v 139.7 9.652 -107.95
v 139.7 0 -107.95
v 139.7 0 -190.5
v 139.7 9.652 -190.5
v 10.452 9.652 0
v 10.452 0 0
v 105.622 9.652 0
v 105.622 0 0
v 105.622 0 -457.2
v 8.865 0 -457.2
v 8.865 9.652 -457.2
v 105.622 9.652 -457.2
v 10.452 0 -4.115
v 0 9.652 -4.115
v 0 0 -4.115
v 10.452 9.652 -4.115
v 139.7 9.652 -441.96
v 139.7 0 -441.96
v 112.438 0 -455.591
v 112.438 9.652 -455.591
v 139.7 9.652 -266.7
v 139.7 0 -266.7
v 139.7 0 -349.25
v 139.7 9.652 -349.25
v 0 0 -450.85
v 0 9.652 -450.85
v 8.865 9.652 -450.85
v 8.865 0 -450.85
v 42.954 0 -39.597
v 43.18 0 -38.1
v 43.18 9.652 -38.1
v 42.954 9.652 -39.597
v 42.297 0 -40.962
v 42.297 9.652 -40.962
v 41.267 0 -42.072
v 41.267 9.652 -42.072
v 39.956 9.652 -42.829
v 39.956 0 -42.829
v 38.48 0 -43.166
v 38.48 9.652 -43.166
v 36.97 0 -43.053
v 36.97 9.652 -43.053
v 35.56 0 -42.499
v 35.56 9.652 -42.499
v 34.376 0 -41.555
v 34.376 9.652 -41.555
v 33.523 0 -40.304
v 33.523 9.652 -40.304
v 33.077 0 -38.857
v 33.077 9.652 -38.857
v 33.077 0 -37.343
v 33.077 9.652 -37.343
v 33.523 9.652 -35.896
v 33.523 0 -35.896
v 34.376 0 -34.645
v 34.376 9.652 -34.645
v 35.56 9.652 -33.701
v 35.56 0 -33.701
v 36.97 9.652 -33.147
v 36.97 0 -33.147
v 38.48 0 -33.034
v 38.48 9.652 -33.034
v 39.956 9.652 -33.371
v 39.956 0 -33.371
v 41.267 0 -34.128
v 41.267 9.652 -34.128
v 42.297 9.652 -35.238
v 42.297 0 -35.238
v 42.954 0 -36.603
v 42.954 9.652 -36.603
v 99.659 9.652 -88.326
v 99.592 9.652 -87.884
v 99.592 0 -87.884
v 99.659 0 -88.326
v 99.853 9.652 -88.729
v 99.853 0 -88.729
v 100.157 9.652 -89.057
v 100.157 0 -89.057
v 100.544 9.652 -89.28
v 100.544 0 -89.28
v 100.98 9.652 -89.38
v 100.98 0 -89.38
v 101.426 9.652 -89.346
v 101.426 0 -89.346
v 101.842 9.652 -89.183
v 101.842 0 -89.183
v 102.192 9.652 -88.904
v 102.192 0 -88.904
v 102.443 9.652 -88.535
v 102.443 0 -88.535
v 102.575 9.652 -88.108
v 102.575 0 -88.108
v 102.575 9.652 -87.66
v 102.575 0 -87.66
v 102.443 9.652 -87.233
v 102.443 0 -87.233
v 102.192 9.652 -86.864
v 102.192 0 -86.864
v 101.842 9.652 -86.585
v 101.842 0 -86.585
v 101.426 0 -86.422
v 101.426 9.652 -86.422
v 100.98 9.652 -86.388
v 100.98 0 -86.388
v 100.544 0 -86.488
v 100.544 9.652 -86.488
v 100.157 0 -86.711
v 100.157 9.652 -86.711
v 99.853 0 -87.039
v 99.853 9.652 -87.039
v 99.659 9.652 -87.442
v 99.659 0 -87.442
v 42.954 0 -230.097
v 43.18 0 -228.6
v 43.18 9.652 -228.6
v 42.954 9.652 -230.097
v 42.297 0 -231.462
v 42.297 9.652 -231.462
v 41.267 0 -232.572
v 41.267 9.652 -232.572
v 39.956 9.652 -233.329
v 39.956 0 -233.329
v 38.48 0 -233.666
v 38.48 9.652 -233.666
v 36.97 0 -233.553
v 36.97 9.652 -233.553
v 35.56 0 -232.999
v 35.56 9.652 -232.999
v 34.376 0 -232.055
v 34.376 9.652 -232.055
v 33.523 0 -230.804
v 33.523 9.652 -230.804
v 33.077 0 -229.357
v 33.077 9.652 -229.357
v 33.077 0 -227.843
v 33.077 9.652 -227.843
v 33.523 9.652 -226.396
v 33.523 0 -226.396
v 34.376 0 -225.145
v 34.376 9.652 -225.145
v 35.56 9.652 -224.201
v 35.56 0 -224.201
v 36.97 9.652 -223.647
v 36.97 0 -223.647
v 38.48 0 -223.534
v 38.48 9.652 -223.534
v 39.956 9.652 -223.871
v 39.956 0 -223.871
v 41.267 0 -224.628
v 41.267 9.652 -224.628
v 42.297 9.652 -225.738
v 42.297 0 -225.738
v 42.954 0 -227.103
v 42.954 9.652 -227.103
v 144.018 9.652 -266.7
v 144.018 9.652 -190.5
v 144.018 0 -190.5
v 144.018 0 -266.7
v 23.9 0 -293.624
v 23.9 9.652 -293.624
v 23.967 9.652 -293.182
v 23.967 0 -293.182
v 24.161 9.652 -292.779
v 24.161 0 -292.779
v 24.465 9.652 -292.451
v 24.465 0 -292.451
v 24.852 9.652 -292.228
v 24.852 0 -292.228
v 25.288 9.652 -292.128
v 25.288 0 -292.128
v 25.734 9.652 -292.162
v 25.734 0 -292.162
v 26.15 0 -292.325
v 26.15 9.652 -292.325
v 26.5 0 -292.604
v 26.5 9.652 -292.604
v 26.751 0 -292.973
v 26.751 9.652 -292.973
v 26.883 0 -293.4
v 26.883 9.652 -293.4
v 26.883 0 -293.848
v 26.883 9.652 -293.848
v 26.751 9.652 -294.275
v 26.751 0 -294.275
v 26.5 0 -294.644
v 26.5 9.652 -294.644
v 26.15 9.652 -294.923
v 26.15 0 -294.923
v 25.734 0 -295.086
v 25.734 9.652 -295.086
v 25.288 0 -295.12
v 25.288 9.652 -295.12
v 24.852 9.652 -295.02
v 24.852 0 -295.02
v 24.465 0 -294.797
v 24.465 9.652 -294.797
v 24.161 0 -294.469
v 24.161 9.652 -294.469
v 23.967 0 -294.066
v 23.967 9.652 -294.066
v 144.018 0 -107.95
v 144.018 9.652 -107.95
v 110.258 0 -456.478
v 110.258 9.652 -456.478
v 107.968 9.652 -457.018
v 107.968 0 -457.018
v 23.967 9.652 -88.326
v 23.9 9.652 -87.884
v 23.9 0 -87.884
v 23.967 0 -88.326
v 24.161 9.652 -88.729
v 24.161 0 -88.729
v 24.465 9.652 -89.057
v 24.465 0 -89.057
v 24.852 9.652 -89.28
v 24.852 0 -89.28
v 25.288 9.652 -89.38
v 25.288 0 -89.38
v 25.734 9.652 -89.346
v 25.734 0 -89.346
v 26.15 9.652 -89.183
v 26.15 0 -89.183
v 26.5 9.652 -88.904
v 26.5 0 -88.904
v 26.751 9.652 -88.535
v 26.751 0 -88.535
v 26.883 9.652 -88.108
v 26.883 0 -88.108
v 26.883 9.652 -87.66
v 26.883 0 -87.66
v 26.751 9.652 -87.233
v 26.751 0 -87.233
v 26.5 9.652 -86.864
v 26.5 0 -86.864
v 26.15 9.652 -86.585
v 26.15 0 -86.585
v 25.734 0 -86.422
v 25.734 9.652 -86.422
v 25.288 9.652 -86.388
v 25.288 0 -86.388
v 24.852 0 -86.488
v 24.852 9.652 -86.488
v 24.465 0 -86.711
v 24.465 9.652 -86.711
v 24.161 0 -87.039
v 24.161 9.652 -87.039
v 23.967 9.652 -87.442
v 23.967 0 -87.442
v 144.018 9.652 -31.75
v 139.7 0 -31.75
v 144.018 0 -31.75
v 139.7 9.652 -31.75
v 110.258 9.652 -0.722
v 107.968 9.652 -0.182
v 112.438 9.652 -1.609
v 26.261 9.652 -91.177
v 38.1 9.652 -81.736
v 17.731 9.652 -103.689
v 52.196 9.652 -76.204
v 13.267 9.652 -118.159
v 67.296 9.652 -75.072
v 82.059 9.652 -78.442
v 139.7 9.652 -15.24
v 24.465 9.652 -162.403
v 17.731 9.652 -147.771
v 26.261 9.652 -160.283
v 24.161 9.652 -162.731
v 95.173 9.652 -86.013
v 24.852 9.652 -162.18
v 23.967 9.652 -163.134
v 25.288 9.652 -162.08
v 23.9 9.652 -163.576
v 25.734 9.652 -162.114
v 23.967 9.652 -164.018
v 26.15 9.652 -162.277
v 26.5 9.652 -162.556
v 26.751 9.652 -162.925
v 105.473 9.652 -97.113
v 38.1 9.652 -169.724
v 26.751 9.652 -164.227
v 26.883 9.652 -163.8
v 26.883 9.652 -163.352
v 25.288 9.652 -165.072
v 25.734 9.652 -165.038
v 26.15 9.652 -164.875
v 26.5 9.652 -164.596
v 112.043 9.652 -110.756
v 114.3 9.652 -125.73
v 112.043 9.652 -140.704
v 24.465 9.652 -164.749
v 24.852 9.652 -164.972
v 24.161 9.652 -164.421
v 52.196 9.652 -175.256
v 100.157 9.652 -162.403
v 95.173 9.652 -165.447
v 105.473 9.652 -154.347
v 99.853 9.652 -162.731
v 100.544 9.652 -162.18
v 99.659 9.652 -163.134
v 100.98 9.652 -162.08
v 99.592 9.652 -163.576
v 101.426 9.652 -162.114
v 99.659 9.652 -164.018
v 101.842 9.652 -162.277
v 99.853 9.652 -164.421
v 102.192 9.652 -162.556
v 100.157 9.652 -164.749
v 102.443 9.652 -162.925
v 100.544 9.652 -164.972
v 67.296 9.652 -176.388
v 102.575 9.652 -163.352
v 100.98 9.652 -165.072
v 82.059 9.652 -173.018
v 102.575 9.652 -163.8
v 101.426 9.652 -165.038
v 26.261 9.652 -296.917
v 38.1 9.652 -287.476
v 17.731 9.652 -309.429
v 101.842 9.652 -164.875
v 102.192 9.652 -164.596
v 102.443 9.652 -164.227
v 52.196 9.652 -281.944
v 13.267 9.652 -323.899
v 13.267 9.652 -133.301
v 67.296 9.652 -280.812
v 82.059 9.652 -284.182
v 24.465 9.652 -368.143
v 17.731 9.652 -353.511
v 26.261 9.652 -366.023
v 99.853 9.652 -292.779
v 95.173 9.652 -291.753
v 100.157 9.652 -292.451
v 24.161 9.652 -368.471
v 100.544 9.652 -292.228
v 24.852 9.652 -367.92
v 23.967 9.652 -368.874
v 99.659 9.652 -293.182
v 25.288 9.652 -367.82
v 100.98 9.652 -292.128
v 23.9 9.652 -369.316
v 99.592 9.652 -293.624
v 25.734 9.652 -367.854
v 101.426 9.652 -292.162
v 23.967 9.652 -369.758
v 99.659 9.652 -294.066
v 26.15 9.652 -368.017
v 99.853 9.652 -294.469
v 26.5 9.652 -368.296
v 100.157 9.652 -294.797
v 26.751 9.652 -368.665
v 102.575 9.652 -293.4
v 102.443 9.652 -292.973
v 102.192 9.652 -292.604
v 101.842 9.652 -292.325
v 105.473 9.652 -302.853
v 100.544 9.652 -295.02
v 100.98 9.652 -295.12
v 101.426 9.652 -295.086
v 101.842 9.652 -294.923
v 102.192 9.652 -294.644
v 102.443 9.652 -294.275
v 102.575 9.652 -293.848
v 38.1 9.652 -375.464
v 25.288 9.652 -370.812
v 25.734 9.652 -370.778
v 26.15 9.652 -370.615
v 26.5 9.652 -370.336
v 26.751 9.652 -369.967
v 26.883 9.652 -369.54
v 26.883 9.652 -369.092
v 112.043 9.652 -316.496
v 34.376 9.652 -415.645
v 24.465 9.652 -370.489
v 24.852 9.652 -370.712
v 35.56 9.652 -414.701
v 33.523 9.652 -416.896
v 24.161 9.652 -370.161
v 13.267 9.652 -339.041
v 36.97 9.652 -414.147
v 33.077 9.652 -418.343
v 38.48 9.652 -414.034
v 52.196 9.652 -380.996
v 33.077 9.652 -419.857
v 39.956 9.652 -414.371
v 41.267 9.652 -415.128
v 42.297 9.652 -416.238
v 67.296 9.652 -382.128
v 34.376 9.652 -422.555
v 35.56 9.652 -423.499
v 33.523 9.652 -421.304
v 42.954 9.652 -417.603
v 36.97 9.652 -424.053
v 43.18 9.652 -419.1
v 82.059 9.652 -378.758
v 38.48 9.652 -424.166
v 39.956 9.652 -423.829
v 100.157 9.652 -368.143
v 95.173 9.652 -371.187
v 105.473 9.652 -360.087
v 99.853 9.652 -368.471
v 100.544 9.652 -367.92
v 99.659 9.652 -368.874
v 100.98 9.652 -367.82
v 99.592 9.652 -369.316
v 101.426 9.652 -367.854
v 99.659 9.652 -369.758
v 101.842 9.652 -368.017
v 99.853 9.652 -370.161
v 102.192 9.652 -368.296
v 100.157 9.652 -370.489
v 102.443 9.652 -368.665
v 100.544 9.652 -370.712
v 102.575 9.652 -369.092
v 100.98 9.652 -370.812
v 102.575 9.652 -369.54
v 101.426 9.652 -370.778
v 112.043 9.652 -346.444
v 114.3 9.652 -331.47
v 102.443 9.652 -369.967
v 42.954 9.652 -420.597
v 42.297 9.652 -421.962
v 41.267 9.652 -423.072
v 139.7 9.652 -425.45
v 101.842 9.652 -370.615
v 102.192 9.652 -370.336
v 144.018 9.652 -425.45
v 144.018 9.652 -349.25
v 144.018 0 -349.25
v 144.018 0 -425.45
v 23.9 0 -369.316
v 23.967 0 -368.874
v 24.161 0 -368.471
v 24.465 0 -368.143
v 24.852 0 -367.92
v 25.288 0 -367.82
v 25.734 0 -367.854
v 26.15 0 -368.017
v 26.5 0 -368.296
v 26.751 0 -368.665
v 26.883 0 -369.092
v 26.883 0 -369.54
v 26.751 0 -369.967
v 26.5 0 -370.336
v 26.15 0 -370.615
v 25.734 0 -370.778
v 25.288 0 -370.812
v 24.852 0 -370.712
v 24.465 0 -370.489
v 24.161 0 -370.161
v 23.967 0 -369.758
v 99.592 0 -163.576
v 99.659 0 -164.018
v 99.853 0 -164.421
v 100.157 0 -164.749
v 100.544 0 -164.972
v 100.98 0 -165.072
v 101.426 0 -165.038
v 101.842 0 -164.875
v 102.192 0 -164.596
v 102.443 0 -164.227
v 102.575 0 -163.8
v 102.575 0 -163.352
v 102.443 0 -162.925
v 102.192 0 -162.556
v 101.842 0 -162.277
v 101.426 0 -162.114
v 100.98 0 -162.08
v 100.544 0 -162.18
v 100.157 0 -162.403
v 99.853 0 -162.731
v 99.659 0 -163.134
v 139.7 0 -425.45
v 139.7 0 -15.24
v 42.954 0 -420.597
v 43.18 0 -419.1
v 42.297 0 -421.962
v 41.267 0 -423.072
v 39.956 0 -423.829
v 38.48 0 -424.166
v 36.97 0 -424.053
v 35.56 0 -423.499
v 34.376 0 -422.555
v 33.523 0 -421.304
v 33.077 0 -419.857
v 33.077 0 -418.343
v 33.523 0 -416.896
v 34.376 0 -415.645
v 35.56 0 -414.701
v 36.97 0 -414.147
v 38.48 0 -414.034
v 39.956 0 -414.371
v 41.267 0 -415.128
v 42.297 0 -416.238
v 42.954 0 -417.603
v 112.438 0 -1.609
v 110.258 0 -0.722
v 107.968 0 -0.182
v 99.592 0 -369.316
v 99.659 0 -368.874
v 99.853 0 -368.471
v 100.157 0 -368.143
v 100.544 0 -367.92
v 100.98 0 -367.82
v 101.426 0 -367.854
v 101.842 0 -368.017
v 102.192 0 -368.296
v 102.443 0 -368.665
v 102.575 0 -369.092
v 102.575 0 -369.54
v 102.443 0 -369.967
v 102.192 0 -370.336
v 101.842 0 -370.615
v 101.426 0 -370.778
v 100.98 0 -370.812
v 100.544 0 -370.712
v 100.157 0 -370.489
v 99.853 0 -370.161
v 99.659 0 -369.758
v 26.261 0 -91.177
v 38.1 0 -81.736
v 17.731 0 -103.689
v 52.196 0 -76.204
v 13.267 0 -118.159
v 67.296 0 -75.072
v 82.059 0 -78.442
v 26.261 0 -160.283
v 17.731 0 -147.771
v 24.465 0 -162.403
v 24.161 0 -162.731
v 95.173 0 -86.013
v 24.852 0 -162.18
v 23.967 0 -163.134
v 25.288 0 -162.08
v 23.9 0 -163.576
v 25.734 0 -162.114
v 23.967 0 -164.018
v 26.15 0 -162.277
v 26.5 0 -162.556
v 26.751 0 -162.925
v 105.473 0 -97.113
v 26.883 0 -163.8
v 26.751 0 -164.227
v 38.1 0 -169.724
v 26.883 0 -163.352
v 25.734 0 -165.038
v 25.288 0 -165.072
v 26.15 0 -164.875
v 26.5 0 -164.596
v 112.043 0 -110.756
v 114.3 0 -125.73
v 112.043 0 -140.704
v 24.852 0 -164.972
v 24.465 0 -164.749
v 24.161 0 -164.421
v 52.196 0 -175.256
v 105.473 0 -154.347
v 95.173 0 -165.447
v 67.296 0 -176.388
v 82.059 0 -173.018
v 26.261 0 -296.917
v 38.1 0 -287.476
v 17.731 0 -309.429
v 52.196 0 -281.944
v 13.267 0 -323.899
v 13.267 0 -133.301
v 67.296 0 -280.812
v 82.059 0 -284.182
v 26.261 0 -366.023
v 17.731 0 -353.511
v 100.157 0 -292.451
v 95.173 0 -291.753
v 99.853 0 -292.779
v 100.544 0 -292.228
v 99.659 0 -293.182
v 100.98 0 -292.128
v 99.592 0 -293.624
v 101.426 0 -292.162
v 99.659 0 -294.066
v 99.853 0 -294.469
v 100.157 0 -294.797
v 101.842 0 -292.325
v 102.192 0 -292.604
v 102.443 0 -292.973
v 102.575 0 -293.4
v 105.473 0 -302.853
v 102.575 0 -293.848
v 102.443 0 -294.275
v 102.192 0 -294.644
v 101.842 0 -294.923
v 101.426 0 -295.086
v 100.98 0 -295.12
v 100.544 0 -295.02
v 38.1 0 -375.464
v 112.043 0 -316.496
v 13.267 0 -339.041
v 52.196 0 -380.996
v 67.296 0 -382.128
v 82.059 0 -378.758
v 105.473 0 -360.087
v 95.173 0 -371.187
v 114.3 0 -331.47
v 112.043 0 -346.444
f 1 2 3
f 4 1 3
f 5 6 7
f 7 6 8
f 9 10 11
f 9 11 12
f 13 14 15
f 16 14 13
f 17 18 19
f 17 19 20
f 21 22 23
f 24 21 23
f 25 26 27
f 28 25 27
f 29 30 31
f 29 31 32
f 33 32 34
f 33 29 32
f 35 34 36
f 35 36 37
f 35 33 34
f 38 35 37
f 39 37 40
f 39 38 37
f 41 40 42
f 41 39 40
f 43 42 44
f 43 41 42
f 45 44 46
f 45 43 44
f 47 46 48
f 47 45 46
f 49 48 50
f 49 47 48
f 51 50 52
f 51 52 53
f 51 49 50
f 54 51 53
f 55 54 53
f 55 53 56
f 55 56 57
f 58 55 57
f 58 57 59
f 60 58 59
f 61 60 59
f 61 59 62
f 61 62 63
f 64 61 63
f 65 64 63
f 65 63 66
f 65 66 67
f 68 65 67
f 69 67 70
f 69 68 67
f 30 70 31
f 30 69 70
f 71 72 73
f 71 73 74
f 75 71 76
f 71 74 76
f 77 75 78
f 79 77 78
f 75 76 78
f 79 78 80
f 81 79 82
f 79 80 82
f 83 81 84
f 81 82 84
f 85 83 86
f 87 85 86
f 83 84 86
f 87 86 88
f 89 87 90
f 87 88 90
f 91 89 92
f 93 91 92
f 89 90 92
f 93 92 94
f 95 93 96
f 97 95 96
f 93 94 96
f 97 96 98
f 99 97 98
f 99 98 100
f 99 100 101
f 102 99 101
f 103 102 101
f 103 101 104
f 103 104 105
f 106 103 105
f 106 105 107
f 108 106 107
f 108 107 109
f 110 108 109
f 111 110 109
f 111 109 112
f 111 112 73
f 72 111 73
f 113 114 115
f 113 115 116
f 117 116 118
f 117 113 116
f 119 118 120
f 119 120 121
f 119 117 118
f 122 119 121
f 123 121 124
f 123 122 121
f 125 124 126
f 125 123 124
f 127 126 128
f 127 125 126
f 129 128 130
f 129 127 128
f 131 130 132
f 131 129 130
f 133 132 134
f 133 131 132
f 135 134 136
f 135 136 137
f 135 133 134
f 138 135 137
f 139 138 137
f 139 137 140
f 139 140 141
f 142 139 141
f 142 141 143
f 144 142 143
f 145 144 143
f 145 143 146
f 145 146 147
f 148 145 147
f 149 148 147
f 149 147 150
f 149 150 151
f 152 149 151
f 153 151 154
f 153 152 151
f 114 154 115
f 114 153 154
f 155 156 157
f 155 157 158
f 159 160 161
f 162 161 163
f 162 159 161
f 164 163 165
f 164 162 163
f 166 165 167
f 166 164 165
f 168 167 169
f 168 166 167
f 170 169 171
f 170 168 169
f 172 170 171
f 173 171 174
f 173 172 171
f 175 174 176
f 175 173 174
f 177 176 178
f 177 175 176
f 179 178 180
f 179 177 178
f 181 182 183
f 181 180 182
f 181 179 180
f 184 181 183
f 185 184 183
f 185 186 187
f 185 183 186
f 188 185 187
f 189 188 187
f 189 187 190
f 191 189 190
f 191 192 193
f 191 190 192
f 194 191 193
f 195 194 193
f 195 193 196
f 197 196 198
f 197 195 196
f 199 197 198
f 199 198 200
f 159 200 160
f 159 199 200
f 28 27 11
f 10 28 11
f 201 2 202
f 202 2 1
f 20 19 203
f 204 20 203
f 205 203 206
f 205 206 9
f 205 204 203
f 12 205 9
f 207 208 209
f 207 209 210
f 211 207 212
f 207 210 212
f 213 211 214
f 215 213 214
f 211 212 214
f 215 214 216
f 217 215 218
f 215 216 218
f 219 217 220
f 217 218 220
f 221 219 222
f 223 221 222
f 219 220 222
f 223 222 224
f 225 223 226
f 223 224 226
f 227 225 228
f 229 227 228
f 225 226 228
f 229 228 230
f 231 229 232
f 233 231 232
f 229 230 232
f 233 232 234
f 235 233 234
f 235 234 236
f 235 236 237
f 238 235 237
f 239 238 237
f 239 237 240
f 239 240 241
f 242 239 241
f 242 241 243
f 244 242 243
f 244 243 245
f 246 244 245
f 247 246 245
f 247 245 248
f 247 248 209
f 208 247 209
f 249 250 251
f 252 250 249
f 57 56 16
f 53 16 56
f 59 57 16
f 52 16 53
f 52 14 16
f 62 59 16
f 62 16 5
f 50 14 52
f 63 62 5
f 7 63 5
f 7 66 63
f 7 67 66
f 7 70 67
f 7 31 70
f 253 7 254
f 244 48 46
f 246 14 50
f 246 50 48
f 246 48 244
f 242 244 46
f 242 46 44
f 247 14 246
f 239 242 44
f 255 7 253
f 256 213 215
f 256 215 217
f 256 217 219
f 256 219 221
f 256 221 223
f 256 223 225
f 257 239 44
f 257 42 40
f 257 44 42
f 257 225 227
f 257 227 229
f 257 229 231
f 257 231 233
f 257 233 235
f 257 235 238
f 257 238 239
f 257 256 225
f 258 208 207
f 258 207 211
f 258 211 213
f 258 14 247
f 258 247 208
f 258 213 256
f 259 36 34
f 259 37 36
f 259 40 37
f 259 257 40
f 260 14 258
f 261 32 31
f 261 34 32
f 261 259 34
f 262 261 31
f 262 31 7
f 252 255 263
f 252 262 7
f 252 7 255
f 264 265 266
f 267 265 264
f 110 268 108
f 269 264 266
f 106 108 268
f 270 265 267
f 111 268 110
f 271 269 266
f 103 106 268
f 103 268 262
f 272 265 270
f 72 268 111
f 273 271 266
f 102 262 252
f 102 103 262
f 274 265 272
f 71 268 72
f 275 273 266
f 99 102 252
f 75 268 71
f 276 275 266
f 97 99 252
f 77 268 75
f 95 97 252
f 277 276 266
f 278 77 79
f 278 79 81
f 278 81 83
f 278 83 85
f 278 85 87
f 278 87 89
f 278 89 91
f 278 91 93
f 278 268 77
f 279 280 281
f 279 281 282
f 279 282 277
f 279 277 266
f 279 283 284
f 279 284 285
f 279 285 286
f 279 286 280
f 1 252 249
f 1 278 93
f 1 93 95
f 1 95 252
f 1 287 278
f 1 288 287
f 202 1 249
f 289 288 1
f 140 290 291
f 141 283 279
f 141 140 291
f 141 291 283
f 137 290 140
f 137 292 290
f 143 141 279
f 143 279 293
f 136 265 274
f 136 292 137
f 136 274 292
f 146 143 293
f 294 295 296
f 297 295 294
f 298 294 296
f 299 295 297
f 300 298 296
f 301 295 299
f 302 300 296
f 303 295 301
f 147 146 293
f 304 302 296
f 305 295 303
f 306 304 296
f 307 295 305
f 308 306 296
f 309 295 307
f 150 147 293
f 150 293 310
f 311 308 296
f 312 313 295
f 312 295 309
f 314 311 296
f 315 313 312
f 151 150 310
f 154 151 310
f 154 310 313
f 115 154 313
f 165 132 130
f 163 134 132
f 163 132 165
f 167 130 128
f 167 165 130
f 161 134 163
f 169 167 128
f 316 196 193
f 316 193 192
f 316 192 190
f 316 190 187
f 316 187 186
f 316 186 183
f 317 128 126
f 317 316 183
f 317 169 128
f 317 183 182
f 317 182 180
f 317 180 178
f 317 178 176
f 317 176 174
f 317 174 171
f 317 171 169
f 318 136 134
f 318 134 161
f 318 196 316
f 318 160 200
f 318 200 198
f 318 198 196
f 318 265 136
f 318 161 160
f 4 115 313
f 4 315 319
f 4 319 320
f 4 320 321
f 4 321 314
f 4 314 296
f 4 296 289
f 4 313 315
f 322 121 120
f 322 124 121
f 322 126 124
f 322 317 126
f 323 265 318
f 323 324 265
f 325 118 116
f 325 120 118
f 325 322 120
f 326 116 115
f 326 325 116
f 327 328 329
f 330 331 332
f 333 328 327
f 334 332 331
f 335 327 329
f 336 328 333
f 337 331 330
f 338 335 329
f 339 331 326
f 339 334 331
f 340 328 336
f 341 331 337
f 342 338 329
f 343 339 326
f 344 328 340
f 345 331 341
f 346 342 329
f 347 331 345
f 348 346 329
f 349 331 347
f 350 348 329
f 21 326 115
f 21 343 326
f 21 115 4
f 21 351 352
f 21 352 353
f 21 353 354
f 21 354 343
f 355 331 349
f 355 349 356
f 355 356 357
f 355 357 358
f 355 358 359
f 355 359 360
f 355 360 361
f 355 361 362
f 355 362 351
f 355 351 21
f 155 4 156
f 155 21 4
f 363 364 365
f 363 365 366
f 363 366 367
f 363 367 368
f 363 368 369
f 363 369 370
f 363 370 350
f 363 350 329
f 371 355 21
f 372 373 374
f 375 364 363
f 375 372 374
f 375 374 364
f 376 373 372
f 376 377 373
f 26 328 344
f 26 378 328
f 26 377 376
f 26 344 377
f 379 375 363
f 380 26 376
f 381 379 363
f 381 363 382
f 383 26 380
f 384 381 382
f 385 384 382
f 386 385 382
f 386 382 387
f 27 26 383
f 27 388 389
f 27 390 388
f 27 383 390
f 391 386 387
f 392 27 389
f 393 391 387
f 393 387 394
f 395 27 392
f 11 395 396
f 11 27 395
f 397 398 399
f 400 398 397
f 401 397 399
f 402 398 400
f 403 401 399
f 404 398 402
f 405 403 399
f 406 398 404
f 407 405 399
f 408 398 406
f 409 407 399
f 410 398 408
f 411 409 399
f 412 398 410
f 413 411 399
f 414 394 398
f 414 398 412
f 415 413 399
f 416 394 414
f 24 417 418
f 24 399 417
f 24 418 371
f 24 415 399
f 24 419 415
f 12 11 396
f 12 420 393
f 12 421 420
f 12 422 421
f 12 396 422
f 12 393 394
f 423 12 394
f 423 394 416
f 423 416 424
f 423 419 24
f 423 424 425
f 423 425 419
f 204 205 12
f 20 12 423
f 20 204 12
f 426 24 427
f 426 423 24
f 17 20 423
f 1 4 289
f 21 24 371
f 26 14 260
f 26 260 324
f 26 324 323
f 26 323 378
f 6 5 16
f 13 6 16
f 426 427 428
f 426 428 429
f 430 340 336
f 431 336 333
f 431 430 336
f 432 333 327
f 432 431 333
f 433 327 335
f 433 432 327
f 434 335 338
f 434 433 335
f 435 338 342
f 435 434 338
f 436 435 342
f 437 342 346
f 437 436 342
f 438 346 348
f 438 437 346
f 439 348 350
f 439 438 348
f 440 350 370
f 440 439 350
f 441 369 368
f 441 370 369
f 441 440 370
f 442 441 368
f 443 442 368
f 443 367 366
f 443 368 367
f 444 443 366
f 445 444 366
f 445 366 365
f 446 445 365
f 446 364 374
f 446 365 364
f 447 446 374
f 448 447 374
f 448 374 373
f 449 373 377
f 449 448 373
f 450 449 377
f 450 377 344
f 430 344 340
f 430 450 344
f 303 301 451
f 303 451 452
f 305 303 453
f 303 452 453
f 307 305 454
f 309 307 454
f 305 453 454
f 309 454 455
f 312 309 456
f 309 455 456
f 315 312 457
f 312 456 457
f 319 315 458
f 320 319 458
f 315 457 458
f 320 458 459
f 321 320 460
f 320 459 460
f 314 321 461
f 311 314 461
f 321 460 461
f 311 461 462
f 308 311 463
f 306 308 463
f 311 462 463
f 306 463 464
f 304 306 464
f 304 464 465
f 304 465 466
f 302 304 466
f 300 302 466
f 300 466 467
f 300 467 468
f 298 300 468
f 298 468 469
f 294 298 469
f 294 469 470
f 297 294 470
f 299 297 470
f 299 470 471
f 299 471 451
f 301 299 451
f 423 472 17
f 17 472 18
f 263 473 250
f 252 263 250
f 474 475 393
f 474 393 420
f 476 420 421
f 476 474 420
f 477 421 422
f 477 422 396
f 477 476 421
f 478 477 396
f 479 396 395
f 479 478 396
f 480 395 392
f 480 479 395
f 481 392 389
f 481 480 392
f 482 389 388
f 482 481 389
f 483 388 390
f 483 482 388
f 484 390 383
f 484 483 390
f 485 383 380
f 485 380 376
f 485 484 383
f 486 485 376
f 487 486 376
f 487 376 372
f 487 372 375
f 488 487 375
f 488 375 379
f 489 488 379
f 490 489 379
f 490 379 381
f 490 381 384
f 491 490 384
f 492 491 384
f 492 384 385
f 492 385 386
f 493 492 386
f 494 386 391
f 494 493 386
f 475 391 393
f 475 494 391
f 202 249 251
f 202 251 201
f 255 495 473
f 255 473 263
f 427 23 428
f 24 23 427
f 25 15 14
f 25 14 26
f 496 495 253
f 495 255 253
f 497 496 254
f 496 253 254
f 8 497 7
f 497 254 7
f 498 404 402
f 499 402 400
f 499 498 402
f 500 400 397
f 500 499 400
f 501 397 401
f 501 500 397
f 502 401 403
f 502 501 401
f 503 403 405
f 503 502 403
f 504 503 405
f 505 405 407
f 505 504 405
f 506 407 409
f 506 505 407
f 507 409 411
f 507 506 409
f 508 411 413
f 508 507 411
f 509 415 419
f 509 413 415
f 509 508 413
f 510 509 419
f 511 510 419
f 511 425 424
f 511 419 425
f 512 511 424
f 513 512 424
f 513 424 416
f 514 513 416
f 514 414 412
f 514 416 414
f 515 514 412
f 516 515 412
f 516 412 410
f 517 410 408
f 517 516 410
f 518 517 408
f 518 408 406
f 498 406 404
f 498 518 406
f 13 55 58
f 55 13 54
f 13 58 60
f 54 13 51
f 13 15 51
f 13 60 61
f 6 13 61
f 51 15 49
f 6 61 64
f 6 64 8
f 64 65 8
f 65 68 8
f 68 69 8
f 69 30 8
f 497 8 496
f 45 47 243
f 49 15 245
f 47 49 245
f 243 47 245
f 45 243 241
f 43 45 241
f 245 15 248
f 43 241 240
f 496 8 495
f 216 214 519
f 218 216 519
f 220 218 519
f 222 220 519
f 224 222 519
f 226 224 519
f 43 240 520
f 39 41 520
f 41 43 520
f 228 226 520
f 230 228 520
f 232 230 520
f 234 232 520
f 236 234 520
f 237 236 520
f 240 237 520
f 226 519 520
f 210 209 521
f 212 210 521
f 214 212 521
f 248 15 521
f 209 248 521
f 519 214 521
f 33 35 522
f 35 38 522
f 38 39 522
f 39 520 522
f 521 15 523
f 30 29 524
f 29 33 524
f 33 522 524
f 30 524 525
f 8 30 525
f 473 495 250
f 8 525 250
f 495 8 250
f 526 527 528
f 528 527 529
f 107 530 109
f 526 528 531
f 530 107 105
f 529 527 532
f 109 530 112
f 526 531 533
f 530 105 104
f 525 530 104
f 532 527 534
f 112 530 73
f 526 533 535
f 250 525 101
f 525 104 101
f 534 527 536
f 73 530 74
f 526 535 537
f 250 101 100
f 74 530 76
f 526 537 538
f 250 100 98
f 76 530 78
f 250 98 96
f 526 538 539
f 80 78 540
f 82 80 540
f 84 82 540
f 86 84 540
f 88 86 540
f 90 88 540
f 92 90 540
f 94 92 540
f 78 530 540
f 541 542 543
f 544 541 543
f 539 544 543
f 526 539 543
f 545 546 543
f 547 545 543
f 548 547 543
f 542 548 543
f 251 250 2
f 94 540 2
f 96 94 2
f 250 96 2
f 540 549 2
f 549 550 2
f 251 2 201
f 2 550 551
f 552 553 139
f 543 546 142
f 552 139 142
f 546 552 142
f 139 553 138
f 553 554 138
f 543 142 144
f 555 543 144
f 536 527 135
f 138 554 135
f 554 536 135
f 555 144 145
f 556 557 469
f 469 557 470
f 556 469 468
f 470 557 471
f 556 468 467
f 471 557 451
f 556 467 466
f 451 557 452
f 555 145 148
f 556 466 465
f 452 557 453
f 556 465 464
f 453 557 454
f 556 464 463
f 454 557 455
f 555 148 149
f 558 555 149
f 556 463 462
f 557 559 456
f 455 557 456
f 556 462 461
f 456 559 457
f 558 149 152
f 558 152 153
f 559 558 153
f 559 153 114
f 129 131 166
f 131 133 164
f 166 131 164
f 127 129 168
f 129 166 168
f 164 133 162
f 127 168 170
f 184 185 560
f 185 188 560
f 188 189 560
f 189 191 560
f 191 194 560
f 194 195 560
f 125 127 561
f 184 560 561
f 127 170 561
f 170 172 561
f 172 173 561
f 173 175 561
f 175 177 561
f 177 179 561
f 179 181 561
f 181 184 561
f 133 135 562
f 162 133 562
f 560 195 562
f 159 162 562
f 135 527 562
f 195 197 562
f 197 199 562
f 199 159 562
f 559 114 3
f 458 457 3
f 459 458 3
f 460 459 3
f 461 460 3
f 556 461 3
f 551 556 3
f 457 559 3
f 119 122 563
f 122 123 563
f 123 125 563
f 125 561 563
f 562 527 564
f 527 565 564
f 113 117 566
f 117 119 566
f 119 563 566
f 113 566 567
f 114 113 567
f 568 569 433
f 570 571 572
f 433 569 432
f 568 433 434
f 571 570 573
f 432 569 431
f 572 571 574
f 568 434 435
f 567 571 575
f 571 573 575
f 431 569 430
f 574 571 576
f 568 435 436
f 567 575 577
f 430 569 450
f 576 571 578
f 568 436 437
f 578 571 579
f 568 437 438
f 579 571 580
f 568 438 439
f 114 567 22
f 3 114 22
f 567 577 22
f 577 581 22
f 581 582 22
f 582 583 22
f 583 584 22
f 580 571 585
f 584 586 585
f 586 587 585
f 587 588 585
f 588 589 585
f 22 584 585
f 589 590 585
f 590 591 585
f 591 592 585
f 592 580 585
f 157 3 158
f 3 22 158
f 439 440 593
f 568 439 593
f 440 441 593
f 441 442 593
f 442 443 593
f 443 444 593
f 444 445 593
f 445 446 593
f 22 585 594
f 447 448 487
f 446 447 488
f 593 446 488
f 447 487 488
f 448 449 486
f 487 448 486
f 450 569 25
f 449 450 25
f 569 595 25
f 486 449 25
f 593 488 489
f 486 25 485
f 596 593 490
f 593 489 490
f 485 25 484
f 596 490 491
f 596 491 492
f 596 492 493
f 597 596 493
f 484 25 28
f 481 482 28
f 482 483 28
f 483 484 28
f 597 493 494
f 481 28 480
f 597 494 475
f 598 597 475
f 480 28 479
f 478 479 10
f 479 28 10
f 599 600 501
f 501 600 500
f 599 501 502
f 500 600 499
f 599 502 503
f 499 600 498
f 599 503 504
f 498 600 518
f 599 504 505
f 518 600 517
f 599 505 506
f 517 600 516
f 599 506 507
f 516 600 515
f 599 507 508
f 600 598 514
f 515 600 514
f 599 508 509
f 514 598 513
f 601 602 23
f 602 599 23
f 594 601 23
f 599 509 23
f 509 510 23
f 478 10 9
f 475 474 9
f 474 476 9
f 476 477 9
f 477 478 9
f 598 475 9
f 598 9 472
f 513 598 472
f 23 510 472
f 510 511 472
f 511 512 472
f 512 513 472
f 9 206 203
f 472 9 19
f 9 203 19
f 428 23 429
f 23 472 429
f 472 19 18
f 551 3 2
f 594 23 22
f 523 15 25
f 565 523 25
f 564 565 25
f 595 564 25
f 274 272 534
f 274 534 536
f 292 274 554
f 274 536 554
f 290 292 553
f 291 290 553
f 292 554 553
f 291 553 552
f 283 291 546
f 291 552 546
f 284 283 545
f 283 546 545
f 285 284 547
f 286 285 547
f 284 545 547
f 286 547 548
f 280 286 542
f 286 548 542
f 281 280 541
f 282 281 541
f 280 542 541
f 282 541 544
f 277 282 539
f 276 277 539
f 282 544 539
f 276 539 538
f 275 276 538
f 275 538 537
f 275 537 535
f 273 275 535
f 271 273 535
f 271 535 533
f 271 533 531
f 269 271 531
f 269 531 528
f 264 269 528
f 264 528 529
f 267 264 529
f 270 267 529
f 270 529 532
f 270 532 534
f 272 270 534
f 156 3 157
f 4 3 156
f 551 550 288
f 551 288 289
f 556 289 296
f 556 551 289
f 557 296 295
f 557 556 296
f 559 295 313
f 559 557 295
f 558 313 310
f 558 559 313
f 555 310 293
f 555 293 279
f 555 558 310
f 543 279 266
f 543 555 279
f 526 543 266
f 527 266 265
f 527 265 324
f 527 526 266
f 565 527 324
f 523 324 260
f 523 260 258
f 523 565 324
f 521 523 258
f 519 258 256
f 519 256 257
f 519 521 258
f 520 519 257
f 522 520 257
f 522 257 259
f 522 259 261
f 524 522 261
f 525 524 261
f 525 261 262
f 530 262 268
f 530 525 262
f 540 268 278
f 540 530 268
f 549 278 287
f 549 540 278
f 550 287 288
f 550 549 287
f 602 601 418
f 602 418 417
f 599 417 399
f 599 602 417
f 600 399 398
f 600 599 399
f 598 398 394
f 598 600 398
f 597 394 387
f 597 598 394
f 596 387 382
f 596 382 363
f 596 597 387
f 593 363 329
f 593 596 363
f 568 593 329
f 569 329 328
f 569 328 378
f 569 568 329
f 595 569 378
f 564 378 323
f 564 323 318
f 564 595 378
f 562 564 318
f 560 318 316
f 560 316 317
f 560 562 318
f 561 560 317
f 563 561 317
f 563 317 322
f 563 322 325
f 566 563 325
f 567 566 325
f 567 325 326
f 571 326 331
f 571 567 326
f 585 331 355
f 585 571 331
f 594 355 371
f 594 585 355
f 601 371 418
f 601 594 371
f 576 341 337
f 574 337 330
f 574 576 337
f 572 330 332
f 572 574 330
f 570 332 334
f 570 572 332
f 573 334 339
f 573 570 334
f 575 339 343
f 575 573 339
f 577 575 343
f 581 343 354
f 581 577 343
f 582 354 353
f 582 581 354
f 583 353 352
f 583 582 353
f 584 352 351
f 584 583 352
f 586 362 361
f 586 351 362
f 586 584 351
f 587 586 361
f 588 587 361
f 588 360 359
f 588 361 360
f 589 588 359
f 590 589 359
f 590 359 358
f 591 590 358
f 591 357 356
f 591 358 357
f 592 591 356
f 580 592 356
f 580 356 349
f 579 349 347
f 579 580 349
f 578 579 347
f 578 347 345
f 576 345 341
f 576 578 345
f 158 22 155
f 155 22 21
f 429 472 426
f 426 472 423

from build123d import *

# Parameters (mm, degrees)
SKETCH1_W                    = 139.7
SKETCH1_H                    = 457.2
SKETCH1_R                    = 50.8
SKETCH1_R_2                  = 5.08
BOSS_EXTRUDE1_DEPTH          = 9.652
SKETCH4_W                    = 10.452383168
SKETCH4_H                    = 4.1148
SKETCH4_W_2                  = 8.864883168
SKETCH4_H_2                  = 6.35
CUT_EXTRUDE1_DEPTH           = 10.652
CHAMFER1_SIZE                = 15.24
CHAMFER1_SIZE2               = 30.48
CHAMFER2_SIZE                = 30.48
CHAMFER2_SIZE2               = 15.24
FILLET2_R                    = 15.24
SKETCH5_W                    = 76.2
SKETCH5_H                    = 9.652
BOSS_EXTRUDE2_DEPTH          = 4.318
F_3_0_3_DIAMETER_HOLE1_D     = 3
F_3_0_3_DIAMETER_HOLE1_DEPTH = 9.652


with BuildPart() as part:
    # Sketch1 → Boss-Extrude1 (new body)
    with BuildSketch(Plane(origin=(0, 0, 0), x_dir=(1, 0, 0), z_dir=(0, 1, 0))):
        with Locations((69.85, 228.6)):
            Rectangle(SKETCH1_W, SKETCH1_H)
        with Locations((63.5, 125.73)):
            Circle(SKETCH1_R, mode=Mode.SUBTRACT)
        with Locations((38.1, 38.1)):
            Circle(SKETCH1_R_2, mode=Mode.SUBTRACT)
        with Locations((38.1, 419.1)):
            Circle(SKETCH1_R_2, mode=Mode.SUBTRACT)
        with Locations((63.5, 331.47)):
            Circle(SKETCH1_R, mode=Mode.SUBTRACT)
        with Locations((38.1, 228.6)):
            Circle(SKETCH1_R_2, mode=Mode.SUBTRACT)
    extrude(amount=BOSS_EXTRUDE1_DEPTH)

    # Sketch4 → Cut-Extrude1 (cut, through all)
    with BuildSketch(Plane(origin=(0, 9.652, 0), x_dir=(1, 0, 0), z_dir=(0, 1, 0))):
        with Locations((5.226191584, 2.0574)):
            Rectangle(SKETCH4_W, SKETCH4_H)
        with Locations((4.432441584, 454.025)):
            Rectangle(SKETCH4_W_2, SKETCH4_H_2)
    extrude(amount=-CUT_EXTRUDE1_DEPTH, mode=Mode.SUBTRACT)

    # Chamfer1
    chamfer1_edges = [part.edges().sort_by_distance(p)[0] for p in [
        (139.7, 4.826, -457.2),
    ]]
    chamfer1_side = [part.faces().sort_by_distance(p)[0] for p in [
        (139.7, 4.826, -228.6),
    ]]
    chamfer(chamfer1_edges, length=CHAMFER1_SIZE, length2=CHAMFER1_SIZE2, reference=chamfer1_side[0])

    # Chamfer2
    chamfer2_edges = [part.edges().sort_by_distance(p)[0] for p in [
        (139.7, 4.826, 0),
    ]]
    chamfer2_side = [part.faces().sort_by_distance(p)[0] for p in [
        (75.076191584, 4.826, 0),
    ]]
    chamfer(chamfer2_edges, length=CHAMFER2_SIZE, length2=CHAMFER2_SIZE2, reference=chamfer2_side[0])

    # Fillet2
    fillet2_edges = [part.edges().sort_by_distance(p)[0] for p in [
        (109.22, 4.826, -457.2),
        (109.22, 4.826, 0),
    ]]
    fillet(fillet2_edges, radius=FILLET2_R)

    # Sketch5 → Boss-Extrude2 (add)
    with BuildSketch(Plane(origin=(139.7, 0, 0), x_dir=(0, 0, -1), z_dir=(1, 0, 0))):
        with Locations((69.85, 4.826)):
            Rectangle(SKETCH5_W, SKETCH5_H)
        with Locations((228.6, 4.826)):
            Rectangle(SKETCH5_W, SKETCH5_H)
        with Locations((387.35, 4.826)):
            Rectangle(SKETCH5_W, SKETCH5_H)
    extrude(amount=BOSS_EXTRUDE2_DEPTH)

    # Ø3.0 (3) Diameter Hole1
    with Locations(Plane(origin=(0, 9.652, 0), x_dir=(1, 0, 0), z_dir=(0, 1, 0))):
        with Locations((101.092, 87.884), (25.4, 87.884), (25.4, 163.576), (101.092, 163.576)):
            f_3_0_3_diameter_hole1 = Hole(F_3_0_3_DIAMETER_HOLE1_D / 2, depth=F_3_0_3_DIAMETER_HOLE1_DEPTH)

    # Mirror1: Ø3.0 (3) Diameter Hole1 across plane
    add(f_3_0_3_diameter_hole1.mirror(Plane.XY.offset(-228.6)), mode=Mode.SUBTRACT)


solid = part.part
